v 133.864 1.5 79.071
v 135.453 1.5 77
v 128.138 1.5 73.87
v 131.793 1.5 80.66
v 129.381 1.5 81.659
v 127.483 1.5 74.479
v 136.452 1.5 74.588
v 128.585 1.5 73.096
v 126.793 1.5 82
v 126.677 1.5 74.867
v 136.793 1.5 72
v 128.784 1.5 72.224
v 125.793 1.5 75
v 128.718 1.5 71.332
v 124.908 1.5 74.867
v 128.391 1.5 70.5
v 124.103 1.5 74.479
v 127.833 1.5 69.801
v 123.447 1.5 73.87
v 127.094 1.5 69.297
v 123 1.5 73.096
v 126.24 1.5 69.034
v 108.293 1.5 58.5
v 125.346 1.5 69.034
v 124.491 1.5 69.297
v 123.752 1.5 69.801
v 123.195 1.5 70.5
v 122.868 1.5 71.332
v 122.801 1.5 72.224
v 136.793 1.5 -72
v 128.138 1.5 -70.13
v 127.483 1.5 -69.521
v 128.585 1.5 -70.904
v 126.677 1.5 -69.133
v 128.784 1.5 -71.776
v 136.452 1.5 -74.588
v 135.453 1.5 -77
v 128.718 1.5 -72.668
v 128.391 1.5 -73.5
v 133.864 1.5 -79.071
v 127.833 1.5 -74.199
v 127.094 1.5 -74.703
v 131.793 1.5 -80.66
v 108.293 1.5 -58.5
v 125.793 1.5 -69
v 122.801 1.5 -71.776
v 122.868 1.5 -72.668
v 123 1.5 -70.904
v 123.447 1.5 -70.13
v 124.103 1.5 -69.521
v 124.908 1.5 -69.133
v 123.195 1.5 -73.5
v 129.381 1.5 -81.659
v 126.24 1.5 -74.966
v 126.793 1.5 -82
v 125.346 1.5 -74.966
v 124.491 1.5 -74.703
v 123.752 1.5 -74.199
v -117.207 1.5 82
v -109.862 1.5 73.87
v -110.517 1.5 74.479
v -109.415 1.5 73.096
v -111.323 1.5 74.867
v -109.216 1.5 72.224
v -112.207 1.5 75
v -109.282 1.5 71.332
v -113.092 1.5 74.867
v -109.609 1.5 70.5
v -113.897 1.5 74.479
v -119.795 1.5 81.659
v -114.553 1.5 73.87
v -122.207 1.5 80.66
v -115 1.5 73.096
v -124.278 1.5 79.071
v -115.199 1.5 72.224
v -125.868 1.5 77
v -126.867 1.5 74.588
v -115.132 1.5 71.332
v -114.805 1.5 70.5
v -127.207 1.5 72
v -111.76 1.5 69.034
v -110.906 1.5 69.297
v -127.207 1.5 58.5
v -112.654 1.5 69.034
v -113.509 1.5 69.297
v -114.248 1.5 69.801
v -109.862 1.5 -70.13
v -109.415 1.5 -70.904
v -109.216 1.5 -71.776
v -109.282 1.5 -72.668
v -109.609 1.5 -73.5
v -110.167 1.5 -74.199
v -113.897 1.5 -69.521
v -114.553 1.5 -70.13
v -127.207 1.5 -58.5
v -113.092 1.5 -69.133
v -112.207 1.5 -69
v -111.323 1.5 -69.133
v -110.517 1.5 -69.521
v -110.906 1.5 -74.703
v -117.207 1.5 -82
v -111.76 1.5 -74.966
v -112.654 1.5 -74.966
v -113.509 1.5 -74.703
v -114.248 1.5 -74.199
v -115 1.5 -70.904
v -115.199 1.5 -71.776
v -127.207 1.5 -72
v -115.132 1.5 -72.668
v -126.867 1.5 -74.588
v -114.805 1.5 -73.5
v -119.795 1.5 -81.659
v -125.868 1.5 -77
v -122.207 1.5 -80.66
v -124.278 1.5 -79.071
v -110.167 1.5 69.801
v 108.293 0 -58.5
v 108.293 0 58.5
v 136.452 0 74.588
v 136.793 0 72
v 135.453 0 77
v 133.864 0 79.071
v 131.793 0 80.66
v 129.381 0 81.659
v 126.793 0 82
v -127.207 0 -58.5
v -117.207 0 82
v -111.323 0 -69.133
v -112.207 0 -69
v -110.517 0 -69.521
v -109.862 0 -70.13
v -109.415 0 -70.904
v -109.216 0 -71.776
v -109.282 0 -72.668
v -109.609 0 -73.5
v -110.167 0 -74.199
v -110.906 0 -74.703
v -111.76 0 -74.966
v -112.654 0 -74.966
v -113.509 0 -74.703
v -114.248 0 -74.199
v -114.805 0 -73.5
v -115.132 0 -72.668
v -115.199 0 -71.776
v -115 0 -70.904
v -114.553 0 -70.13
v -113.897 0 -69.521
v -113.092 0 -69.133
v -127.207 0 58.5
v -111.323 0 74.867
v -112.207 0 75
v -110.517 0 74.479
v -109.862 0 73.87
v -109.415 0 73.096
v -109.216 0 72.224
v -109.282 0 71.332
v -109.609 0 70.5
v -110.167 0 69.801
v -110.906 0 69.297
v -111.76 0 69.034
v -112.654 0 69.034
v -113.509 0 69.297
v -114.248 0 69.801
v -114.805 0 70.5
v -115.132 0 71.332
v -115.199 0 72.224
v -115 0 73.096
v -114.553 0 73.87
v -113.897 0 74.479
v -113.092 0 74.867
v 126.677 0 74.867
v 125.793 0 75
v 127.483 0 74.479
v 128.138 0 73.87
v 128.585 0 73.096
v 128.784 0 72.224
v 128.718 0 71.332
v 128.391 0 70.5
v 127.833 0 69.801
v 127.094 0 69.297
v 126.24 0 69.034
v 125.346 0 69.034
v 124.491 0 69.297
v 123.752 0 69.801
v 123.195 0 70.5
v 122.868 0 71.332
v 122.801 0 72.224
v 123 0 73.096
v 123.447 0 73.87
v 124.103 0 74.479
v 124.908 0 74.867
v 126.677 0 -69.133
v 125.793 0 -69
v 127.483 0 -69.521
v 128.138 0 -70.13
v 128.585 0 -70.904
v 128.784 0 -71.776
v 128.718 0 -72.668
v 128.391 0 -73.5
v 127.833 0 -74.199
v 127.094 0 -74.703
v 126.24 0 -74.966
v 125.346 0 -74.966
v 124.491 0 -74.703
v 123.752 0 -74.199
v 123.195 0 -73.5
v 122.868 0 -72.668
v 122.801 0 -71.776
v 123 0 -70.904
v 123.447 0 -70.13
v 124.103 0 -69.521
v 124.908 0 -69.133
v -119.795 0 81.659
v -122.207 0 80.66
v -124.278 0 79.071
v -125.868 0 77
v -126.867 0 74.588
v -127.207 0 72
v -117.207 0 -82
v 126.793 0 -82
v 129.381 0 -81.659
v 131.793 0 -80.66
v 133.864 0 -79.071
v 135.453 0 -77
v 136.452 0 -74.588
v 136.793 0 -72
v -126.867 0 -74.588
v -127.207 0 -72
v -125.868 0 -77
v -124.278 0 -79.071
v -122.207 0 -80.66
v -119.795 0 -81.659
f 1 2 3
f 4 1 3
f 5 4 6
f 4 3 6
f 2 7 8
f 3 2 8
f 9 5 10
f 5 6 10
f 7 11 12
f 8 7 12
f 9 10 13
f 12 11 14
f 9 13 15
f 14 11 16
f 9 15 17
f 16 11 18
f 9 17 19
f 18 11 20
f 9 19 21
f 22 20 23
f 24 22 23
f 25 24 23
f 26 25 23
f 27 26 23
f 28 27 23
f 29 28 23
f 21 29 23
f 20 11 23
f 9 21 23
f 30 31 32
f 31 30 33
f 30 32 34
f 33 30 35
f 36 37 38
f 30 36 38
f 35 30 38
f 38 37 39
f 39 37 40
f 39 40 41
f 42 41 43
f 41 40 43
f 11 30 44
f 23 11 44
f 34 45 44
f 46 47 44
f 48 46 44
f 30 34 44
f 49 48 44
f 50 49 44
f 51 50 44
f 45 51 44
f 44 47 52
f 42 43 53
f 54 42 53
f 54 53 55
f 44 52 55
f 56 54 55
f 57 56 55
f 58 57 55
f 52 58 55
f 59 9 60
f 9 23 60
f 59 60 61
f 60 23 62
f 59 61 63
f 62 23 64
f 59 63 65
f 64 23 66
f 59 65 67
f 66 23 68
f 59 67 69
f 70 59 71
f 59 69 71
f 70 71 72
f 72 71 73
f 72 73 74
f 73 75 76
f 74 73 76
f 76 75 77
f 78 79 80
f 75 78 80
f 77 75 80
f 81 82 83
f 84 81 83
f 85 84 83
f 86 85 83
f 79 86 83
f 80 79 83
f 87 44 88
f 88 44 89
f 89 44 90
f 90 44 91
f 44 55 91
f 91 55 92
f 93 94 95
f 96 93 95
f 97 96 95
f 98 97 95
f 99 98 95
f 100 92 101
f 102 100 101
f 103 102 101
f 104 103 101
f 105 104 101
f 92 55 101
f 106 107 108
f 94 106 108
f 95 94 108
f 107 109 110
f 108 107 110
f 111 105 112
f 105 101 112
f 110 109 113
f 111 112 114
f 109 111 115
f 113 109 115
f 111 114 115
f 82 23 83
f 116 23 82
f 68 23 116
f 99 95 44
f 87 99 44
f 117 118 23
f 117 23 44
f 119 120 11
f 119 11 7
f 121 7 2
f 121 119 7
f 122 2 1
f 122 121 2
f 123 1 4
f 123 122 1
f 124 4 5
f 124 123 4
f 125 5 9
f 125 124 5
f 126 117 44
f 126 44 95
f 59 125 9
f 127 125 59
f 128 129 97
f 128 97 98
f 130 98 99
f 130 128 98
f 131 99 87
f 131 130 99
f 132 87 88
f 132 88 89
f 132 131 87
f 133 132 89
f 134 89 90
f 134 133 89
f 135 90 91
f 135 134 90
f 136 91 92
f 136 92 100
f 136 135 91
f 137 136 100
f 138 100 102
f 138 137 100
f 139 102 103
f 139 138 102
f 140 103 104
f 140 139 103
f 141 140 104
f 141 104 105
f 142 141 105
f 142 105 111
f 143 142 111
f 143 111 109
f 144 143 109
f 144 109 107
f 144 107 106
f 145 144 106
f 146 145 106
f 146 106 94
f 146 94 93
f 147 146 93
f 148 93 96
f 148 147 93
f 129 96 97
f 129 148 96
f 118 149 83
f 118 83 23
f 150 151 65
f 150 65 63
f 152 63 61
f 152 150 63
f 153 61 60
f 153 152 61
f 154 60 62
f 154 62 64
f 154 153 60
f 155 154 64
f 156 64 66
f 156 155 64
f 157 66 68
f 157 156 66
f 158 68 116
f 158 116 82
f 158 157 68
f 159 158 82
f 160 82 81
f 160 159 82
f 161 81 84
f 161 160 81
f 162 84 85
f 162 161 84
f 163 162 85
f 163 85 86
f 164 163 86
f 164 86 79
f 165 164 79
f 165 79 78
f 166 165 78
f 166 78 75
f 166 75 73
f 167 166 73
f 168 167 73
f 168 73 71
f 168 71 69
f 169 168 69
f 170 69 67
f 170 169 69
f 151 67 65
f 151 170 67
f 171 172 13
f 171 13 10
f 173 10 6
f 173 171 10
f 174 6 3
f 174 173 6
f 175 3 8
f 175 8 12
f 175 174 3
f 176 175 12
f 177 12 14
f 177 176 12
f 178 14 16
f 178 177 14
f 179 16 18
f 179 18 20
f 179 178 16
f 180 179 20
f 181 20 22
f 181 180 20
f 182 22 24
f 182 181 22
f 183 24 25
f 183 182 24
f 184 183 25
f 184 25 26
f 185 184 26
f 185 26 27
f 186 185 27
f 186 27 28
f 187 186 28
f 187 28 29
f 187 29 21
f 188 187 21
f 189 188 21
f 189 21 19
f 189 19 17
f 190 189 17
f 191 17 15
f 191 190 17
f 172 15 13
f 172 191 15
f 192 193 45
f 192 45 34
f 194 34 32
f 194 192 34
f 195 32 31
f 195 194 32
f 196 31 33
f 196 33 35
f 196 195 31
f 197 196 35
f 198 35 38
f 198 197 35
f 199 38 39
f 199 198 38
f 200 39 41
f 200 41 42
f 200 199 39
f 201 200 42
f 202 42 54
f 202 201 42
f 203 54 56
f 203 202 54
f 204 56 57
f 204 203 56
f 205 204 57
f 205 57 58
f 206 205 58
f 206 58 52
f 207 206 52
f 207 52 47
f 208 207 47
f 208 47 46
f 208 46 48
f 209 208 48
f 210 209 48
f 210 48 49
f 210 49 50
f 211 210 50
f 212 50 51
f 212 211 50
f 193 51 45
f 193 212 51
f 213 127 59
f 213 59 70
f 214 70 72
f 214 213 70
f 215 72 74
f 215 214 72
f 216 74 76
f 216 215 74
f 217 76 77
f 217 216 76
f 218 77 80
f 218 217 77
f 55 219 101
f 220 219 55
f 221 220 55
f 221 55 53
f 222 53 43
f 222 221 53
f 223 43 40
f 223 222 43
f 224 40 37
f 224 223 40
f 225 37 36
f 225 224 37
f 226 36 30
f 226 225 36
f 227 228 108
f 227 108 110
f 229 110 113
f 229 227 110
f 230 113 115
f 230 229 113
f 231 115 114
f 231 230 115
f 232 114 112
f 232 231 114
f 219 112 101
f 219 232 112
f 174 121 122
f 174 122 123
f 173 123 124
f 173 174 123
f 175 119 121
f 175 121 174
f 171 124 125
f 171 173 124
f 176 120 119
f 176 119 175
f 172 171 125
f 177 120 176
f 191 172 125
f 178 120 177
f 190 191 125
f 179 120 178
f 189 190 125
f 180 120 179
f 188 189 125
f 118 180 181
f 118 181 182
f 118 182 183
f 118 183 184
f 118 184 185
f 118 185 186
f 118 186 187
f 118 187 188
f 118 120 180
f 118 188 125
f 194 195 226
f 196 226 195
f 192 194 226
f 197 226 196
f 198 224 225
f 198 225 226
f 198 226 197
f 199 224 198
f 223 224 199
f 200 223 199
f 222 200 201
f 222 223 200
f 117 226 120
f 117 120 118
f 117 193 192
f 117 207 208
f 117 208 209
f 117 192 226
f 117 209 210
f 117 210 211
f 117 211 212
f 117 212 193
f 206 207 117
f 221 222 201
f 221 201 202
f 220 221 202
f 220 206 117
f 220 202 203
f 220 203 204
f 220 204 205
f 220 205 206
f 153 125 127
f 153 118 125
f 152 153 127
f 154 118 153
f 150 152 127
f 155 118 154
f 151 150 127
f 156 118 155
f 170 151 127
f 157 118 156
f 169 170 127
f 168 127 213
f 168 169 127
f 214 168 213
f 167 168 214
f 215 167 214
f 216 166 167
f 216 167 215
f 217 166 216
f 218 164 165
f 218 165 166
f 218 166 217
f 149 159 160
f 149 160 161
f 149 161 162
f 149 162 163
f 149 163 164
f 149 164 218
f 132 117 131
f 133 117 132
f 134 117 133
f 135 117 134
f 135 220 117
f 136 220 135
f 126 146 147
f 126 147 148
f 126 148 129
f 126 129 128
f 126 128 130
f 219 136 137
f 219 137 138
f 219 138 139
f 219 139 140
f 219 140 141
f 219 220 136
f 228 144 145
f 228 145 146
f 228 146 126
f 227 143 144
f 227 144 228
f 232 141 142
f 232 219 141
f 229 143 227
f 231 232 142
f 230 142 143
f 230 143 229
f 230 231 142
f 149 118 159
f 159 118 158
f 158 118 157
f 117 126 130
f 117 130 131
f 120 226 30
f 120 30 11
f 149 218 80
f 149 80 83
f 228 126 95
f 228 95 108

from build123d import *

# Parameters (mm, degrees)
SKETCH1_R          = 3
BASE_FLANGE1_DEPTH = 1.5


# Sheet-metal steps are written as plain solids
with BuildPart() as part:
    # Sketch1 → Base-Flange1 (new body)
    with BuildSketch(Plane(origin=(0, 0, 0), x_dir=(1, 0, 0), z_dir=(0, 1, 0))):
        with BuildLine():
            Line((-127.207269821, 58.5), (-127.207269821, 72))
            ThreePointArc((-127.207269821, 72), (-124.278337633, 79.071067812), (-117.207269821, 82))
            Line((-117.207269821, 82), (126.792730179, 82))
            ThreePointArc((126.792730179, 82), (133.863797991, 79.071067812), (136.792730179, 72))
            Line((136.792730179, 72), (136.792730179, -72))
            ThreePointArc((136.792730179, -72), (133.863797991, -79.071067812), (126.792730179, -82))
            Line((126.792730179, -82), (-117.207269821, -82))
            ThreePointArc((-117.207269821, -82), (-124.278337633, -79.071067812), (-127.207269821, -72))
            Line((-127.207269821, -72), (-127.207269821, -58.5))
            Line((-127.207269821, -58.5), (108.292730179, -58.5))
            Line((108.292730179, -58.5), (108.292730179, 58.5))
            Line((108.292730179, 58.5), (-127.207269821, 58.5))
        make_face()
        with Locations(Location((125.792730179, 72, 0), (0, 0, 270))):
            Circle(SKETCH1_R, mode=Mode.SUBTRACT)
        with Locations(Location((-112.207269821, 72, 0), (0, 0, 270))):
            Circle(SKETCH1_R, mode=Mode.SUBTRACT)
        with Locations(Location((-112.207269821, -72, 0), (0, 0, 270))):
            Circle(SKETCH1_R, mode=Mode.SUBTRACT)
        with Locations(Location((125.792730179, -72, 0), (0, 0, 270))):
            Circle(SKETCH1_R, mode=Mode.SUBTRACT)
    extrude(amount=BASE_FLANGE1_DEPTH)


solid = part.part
